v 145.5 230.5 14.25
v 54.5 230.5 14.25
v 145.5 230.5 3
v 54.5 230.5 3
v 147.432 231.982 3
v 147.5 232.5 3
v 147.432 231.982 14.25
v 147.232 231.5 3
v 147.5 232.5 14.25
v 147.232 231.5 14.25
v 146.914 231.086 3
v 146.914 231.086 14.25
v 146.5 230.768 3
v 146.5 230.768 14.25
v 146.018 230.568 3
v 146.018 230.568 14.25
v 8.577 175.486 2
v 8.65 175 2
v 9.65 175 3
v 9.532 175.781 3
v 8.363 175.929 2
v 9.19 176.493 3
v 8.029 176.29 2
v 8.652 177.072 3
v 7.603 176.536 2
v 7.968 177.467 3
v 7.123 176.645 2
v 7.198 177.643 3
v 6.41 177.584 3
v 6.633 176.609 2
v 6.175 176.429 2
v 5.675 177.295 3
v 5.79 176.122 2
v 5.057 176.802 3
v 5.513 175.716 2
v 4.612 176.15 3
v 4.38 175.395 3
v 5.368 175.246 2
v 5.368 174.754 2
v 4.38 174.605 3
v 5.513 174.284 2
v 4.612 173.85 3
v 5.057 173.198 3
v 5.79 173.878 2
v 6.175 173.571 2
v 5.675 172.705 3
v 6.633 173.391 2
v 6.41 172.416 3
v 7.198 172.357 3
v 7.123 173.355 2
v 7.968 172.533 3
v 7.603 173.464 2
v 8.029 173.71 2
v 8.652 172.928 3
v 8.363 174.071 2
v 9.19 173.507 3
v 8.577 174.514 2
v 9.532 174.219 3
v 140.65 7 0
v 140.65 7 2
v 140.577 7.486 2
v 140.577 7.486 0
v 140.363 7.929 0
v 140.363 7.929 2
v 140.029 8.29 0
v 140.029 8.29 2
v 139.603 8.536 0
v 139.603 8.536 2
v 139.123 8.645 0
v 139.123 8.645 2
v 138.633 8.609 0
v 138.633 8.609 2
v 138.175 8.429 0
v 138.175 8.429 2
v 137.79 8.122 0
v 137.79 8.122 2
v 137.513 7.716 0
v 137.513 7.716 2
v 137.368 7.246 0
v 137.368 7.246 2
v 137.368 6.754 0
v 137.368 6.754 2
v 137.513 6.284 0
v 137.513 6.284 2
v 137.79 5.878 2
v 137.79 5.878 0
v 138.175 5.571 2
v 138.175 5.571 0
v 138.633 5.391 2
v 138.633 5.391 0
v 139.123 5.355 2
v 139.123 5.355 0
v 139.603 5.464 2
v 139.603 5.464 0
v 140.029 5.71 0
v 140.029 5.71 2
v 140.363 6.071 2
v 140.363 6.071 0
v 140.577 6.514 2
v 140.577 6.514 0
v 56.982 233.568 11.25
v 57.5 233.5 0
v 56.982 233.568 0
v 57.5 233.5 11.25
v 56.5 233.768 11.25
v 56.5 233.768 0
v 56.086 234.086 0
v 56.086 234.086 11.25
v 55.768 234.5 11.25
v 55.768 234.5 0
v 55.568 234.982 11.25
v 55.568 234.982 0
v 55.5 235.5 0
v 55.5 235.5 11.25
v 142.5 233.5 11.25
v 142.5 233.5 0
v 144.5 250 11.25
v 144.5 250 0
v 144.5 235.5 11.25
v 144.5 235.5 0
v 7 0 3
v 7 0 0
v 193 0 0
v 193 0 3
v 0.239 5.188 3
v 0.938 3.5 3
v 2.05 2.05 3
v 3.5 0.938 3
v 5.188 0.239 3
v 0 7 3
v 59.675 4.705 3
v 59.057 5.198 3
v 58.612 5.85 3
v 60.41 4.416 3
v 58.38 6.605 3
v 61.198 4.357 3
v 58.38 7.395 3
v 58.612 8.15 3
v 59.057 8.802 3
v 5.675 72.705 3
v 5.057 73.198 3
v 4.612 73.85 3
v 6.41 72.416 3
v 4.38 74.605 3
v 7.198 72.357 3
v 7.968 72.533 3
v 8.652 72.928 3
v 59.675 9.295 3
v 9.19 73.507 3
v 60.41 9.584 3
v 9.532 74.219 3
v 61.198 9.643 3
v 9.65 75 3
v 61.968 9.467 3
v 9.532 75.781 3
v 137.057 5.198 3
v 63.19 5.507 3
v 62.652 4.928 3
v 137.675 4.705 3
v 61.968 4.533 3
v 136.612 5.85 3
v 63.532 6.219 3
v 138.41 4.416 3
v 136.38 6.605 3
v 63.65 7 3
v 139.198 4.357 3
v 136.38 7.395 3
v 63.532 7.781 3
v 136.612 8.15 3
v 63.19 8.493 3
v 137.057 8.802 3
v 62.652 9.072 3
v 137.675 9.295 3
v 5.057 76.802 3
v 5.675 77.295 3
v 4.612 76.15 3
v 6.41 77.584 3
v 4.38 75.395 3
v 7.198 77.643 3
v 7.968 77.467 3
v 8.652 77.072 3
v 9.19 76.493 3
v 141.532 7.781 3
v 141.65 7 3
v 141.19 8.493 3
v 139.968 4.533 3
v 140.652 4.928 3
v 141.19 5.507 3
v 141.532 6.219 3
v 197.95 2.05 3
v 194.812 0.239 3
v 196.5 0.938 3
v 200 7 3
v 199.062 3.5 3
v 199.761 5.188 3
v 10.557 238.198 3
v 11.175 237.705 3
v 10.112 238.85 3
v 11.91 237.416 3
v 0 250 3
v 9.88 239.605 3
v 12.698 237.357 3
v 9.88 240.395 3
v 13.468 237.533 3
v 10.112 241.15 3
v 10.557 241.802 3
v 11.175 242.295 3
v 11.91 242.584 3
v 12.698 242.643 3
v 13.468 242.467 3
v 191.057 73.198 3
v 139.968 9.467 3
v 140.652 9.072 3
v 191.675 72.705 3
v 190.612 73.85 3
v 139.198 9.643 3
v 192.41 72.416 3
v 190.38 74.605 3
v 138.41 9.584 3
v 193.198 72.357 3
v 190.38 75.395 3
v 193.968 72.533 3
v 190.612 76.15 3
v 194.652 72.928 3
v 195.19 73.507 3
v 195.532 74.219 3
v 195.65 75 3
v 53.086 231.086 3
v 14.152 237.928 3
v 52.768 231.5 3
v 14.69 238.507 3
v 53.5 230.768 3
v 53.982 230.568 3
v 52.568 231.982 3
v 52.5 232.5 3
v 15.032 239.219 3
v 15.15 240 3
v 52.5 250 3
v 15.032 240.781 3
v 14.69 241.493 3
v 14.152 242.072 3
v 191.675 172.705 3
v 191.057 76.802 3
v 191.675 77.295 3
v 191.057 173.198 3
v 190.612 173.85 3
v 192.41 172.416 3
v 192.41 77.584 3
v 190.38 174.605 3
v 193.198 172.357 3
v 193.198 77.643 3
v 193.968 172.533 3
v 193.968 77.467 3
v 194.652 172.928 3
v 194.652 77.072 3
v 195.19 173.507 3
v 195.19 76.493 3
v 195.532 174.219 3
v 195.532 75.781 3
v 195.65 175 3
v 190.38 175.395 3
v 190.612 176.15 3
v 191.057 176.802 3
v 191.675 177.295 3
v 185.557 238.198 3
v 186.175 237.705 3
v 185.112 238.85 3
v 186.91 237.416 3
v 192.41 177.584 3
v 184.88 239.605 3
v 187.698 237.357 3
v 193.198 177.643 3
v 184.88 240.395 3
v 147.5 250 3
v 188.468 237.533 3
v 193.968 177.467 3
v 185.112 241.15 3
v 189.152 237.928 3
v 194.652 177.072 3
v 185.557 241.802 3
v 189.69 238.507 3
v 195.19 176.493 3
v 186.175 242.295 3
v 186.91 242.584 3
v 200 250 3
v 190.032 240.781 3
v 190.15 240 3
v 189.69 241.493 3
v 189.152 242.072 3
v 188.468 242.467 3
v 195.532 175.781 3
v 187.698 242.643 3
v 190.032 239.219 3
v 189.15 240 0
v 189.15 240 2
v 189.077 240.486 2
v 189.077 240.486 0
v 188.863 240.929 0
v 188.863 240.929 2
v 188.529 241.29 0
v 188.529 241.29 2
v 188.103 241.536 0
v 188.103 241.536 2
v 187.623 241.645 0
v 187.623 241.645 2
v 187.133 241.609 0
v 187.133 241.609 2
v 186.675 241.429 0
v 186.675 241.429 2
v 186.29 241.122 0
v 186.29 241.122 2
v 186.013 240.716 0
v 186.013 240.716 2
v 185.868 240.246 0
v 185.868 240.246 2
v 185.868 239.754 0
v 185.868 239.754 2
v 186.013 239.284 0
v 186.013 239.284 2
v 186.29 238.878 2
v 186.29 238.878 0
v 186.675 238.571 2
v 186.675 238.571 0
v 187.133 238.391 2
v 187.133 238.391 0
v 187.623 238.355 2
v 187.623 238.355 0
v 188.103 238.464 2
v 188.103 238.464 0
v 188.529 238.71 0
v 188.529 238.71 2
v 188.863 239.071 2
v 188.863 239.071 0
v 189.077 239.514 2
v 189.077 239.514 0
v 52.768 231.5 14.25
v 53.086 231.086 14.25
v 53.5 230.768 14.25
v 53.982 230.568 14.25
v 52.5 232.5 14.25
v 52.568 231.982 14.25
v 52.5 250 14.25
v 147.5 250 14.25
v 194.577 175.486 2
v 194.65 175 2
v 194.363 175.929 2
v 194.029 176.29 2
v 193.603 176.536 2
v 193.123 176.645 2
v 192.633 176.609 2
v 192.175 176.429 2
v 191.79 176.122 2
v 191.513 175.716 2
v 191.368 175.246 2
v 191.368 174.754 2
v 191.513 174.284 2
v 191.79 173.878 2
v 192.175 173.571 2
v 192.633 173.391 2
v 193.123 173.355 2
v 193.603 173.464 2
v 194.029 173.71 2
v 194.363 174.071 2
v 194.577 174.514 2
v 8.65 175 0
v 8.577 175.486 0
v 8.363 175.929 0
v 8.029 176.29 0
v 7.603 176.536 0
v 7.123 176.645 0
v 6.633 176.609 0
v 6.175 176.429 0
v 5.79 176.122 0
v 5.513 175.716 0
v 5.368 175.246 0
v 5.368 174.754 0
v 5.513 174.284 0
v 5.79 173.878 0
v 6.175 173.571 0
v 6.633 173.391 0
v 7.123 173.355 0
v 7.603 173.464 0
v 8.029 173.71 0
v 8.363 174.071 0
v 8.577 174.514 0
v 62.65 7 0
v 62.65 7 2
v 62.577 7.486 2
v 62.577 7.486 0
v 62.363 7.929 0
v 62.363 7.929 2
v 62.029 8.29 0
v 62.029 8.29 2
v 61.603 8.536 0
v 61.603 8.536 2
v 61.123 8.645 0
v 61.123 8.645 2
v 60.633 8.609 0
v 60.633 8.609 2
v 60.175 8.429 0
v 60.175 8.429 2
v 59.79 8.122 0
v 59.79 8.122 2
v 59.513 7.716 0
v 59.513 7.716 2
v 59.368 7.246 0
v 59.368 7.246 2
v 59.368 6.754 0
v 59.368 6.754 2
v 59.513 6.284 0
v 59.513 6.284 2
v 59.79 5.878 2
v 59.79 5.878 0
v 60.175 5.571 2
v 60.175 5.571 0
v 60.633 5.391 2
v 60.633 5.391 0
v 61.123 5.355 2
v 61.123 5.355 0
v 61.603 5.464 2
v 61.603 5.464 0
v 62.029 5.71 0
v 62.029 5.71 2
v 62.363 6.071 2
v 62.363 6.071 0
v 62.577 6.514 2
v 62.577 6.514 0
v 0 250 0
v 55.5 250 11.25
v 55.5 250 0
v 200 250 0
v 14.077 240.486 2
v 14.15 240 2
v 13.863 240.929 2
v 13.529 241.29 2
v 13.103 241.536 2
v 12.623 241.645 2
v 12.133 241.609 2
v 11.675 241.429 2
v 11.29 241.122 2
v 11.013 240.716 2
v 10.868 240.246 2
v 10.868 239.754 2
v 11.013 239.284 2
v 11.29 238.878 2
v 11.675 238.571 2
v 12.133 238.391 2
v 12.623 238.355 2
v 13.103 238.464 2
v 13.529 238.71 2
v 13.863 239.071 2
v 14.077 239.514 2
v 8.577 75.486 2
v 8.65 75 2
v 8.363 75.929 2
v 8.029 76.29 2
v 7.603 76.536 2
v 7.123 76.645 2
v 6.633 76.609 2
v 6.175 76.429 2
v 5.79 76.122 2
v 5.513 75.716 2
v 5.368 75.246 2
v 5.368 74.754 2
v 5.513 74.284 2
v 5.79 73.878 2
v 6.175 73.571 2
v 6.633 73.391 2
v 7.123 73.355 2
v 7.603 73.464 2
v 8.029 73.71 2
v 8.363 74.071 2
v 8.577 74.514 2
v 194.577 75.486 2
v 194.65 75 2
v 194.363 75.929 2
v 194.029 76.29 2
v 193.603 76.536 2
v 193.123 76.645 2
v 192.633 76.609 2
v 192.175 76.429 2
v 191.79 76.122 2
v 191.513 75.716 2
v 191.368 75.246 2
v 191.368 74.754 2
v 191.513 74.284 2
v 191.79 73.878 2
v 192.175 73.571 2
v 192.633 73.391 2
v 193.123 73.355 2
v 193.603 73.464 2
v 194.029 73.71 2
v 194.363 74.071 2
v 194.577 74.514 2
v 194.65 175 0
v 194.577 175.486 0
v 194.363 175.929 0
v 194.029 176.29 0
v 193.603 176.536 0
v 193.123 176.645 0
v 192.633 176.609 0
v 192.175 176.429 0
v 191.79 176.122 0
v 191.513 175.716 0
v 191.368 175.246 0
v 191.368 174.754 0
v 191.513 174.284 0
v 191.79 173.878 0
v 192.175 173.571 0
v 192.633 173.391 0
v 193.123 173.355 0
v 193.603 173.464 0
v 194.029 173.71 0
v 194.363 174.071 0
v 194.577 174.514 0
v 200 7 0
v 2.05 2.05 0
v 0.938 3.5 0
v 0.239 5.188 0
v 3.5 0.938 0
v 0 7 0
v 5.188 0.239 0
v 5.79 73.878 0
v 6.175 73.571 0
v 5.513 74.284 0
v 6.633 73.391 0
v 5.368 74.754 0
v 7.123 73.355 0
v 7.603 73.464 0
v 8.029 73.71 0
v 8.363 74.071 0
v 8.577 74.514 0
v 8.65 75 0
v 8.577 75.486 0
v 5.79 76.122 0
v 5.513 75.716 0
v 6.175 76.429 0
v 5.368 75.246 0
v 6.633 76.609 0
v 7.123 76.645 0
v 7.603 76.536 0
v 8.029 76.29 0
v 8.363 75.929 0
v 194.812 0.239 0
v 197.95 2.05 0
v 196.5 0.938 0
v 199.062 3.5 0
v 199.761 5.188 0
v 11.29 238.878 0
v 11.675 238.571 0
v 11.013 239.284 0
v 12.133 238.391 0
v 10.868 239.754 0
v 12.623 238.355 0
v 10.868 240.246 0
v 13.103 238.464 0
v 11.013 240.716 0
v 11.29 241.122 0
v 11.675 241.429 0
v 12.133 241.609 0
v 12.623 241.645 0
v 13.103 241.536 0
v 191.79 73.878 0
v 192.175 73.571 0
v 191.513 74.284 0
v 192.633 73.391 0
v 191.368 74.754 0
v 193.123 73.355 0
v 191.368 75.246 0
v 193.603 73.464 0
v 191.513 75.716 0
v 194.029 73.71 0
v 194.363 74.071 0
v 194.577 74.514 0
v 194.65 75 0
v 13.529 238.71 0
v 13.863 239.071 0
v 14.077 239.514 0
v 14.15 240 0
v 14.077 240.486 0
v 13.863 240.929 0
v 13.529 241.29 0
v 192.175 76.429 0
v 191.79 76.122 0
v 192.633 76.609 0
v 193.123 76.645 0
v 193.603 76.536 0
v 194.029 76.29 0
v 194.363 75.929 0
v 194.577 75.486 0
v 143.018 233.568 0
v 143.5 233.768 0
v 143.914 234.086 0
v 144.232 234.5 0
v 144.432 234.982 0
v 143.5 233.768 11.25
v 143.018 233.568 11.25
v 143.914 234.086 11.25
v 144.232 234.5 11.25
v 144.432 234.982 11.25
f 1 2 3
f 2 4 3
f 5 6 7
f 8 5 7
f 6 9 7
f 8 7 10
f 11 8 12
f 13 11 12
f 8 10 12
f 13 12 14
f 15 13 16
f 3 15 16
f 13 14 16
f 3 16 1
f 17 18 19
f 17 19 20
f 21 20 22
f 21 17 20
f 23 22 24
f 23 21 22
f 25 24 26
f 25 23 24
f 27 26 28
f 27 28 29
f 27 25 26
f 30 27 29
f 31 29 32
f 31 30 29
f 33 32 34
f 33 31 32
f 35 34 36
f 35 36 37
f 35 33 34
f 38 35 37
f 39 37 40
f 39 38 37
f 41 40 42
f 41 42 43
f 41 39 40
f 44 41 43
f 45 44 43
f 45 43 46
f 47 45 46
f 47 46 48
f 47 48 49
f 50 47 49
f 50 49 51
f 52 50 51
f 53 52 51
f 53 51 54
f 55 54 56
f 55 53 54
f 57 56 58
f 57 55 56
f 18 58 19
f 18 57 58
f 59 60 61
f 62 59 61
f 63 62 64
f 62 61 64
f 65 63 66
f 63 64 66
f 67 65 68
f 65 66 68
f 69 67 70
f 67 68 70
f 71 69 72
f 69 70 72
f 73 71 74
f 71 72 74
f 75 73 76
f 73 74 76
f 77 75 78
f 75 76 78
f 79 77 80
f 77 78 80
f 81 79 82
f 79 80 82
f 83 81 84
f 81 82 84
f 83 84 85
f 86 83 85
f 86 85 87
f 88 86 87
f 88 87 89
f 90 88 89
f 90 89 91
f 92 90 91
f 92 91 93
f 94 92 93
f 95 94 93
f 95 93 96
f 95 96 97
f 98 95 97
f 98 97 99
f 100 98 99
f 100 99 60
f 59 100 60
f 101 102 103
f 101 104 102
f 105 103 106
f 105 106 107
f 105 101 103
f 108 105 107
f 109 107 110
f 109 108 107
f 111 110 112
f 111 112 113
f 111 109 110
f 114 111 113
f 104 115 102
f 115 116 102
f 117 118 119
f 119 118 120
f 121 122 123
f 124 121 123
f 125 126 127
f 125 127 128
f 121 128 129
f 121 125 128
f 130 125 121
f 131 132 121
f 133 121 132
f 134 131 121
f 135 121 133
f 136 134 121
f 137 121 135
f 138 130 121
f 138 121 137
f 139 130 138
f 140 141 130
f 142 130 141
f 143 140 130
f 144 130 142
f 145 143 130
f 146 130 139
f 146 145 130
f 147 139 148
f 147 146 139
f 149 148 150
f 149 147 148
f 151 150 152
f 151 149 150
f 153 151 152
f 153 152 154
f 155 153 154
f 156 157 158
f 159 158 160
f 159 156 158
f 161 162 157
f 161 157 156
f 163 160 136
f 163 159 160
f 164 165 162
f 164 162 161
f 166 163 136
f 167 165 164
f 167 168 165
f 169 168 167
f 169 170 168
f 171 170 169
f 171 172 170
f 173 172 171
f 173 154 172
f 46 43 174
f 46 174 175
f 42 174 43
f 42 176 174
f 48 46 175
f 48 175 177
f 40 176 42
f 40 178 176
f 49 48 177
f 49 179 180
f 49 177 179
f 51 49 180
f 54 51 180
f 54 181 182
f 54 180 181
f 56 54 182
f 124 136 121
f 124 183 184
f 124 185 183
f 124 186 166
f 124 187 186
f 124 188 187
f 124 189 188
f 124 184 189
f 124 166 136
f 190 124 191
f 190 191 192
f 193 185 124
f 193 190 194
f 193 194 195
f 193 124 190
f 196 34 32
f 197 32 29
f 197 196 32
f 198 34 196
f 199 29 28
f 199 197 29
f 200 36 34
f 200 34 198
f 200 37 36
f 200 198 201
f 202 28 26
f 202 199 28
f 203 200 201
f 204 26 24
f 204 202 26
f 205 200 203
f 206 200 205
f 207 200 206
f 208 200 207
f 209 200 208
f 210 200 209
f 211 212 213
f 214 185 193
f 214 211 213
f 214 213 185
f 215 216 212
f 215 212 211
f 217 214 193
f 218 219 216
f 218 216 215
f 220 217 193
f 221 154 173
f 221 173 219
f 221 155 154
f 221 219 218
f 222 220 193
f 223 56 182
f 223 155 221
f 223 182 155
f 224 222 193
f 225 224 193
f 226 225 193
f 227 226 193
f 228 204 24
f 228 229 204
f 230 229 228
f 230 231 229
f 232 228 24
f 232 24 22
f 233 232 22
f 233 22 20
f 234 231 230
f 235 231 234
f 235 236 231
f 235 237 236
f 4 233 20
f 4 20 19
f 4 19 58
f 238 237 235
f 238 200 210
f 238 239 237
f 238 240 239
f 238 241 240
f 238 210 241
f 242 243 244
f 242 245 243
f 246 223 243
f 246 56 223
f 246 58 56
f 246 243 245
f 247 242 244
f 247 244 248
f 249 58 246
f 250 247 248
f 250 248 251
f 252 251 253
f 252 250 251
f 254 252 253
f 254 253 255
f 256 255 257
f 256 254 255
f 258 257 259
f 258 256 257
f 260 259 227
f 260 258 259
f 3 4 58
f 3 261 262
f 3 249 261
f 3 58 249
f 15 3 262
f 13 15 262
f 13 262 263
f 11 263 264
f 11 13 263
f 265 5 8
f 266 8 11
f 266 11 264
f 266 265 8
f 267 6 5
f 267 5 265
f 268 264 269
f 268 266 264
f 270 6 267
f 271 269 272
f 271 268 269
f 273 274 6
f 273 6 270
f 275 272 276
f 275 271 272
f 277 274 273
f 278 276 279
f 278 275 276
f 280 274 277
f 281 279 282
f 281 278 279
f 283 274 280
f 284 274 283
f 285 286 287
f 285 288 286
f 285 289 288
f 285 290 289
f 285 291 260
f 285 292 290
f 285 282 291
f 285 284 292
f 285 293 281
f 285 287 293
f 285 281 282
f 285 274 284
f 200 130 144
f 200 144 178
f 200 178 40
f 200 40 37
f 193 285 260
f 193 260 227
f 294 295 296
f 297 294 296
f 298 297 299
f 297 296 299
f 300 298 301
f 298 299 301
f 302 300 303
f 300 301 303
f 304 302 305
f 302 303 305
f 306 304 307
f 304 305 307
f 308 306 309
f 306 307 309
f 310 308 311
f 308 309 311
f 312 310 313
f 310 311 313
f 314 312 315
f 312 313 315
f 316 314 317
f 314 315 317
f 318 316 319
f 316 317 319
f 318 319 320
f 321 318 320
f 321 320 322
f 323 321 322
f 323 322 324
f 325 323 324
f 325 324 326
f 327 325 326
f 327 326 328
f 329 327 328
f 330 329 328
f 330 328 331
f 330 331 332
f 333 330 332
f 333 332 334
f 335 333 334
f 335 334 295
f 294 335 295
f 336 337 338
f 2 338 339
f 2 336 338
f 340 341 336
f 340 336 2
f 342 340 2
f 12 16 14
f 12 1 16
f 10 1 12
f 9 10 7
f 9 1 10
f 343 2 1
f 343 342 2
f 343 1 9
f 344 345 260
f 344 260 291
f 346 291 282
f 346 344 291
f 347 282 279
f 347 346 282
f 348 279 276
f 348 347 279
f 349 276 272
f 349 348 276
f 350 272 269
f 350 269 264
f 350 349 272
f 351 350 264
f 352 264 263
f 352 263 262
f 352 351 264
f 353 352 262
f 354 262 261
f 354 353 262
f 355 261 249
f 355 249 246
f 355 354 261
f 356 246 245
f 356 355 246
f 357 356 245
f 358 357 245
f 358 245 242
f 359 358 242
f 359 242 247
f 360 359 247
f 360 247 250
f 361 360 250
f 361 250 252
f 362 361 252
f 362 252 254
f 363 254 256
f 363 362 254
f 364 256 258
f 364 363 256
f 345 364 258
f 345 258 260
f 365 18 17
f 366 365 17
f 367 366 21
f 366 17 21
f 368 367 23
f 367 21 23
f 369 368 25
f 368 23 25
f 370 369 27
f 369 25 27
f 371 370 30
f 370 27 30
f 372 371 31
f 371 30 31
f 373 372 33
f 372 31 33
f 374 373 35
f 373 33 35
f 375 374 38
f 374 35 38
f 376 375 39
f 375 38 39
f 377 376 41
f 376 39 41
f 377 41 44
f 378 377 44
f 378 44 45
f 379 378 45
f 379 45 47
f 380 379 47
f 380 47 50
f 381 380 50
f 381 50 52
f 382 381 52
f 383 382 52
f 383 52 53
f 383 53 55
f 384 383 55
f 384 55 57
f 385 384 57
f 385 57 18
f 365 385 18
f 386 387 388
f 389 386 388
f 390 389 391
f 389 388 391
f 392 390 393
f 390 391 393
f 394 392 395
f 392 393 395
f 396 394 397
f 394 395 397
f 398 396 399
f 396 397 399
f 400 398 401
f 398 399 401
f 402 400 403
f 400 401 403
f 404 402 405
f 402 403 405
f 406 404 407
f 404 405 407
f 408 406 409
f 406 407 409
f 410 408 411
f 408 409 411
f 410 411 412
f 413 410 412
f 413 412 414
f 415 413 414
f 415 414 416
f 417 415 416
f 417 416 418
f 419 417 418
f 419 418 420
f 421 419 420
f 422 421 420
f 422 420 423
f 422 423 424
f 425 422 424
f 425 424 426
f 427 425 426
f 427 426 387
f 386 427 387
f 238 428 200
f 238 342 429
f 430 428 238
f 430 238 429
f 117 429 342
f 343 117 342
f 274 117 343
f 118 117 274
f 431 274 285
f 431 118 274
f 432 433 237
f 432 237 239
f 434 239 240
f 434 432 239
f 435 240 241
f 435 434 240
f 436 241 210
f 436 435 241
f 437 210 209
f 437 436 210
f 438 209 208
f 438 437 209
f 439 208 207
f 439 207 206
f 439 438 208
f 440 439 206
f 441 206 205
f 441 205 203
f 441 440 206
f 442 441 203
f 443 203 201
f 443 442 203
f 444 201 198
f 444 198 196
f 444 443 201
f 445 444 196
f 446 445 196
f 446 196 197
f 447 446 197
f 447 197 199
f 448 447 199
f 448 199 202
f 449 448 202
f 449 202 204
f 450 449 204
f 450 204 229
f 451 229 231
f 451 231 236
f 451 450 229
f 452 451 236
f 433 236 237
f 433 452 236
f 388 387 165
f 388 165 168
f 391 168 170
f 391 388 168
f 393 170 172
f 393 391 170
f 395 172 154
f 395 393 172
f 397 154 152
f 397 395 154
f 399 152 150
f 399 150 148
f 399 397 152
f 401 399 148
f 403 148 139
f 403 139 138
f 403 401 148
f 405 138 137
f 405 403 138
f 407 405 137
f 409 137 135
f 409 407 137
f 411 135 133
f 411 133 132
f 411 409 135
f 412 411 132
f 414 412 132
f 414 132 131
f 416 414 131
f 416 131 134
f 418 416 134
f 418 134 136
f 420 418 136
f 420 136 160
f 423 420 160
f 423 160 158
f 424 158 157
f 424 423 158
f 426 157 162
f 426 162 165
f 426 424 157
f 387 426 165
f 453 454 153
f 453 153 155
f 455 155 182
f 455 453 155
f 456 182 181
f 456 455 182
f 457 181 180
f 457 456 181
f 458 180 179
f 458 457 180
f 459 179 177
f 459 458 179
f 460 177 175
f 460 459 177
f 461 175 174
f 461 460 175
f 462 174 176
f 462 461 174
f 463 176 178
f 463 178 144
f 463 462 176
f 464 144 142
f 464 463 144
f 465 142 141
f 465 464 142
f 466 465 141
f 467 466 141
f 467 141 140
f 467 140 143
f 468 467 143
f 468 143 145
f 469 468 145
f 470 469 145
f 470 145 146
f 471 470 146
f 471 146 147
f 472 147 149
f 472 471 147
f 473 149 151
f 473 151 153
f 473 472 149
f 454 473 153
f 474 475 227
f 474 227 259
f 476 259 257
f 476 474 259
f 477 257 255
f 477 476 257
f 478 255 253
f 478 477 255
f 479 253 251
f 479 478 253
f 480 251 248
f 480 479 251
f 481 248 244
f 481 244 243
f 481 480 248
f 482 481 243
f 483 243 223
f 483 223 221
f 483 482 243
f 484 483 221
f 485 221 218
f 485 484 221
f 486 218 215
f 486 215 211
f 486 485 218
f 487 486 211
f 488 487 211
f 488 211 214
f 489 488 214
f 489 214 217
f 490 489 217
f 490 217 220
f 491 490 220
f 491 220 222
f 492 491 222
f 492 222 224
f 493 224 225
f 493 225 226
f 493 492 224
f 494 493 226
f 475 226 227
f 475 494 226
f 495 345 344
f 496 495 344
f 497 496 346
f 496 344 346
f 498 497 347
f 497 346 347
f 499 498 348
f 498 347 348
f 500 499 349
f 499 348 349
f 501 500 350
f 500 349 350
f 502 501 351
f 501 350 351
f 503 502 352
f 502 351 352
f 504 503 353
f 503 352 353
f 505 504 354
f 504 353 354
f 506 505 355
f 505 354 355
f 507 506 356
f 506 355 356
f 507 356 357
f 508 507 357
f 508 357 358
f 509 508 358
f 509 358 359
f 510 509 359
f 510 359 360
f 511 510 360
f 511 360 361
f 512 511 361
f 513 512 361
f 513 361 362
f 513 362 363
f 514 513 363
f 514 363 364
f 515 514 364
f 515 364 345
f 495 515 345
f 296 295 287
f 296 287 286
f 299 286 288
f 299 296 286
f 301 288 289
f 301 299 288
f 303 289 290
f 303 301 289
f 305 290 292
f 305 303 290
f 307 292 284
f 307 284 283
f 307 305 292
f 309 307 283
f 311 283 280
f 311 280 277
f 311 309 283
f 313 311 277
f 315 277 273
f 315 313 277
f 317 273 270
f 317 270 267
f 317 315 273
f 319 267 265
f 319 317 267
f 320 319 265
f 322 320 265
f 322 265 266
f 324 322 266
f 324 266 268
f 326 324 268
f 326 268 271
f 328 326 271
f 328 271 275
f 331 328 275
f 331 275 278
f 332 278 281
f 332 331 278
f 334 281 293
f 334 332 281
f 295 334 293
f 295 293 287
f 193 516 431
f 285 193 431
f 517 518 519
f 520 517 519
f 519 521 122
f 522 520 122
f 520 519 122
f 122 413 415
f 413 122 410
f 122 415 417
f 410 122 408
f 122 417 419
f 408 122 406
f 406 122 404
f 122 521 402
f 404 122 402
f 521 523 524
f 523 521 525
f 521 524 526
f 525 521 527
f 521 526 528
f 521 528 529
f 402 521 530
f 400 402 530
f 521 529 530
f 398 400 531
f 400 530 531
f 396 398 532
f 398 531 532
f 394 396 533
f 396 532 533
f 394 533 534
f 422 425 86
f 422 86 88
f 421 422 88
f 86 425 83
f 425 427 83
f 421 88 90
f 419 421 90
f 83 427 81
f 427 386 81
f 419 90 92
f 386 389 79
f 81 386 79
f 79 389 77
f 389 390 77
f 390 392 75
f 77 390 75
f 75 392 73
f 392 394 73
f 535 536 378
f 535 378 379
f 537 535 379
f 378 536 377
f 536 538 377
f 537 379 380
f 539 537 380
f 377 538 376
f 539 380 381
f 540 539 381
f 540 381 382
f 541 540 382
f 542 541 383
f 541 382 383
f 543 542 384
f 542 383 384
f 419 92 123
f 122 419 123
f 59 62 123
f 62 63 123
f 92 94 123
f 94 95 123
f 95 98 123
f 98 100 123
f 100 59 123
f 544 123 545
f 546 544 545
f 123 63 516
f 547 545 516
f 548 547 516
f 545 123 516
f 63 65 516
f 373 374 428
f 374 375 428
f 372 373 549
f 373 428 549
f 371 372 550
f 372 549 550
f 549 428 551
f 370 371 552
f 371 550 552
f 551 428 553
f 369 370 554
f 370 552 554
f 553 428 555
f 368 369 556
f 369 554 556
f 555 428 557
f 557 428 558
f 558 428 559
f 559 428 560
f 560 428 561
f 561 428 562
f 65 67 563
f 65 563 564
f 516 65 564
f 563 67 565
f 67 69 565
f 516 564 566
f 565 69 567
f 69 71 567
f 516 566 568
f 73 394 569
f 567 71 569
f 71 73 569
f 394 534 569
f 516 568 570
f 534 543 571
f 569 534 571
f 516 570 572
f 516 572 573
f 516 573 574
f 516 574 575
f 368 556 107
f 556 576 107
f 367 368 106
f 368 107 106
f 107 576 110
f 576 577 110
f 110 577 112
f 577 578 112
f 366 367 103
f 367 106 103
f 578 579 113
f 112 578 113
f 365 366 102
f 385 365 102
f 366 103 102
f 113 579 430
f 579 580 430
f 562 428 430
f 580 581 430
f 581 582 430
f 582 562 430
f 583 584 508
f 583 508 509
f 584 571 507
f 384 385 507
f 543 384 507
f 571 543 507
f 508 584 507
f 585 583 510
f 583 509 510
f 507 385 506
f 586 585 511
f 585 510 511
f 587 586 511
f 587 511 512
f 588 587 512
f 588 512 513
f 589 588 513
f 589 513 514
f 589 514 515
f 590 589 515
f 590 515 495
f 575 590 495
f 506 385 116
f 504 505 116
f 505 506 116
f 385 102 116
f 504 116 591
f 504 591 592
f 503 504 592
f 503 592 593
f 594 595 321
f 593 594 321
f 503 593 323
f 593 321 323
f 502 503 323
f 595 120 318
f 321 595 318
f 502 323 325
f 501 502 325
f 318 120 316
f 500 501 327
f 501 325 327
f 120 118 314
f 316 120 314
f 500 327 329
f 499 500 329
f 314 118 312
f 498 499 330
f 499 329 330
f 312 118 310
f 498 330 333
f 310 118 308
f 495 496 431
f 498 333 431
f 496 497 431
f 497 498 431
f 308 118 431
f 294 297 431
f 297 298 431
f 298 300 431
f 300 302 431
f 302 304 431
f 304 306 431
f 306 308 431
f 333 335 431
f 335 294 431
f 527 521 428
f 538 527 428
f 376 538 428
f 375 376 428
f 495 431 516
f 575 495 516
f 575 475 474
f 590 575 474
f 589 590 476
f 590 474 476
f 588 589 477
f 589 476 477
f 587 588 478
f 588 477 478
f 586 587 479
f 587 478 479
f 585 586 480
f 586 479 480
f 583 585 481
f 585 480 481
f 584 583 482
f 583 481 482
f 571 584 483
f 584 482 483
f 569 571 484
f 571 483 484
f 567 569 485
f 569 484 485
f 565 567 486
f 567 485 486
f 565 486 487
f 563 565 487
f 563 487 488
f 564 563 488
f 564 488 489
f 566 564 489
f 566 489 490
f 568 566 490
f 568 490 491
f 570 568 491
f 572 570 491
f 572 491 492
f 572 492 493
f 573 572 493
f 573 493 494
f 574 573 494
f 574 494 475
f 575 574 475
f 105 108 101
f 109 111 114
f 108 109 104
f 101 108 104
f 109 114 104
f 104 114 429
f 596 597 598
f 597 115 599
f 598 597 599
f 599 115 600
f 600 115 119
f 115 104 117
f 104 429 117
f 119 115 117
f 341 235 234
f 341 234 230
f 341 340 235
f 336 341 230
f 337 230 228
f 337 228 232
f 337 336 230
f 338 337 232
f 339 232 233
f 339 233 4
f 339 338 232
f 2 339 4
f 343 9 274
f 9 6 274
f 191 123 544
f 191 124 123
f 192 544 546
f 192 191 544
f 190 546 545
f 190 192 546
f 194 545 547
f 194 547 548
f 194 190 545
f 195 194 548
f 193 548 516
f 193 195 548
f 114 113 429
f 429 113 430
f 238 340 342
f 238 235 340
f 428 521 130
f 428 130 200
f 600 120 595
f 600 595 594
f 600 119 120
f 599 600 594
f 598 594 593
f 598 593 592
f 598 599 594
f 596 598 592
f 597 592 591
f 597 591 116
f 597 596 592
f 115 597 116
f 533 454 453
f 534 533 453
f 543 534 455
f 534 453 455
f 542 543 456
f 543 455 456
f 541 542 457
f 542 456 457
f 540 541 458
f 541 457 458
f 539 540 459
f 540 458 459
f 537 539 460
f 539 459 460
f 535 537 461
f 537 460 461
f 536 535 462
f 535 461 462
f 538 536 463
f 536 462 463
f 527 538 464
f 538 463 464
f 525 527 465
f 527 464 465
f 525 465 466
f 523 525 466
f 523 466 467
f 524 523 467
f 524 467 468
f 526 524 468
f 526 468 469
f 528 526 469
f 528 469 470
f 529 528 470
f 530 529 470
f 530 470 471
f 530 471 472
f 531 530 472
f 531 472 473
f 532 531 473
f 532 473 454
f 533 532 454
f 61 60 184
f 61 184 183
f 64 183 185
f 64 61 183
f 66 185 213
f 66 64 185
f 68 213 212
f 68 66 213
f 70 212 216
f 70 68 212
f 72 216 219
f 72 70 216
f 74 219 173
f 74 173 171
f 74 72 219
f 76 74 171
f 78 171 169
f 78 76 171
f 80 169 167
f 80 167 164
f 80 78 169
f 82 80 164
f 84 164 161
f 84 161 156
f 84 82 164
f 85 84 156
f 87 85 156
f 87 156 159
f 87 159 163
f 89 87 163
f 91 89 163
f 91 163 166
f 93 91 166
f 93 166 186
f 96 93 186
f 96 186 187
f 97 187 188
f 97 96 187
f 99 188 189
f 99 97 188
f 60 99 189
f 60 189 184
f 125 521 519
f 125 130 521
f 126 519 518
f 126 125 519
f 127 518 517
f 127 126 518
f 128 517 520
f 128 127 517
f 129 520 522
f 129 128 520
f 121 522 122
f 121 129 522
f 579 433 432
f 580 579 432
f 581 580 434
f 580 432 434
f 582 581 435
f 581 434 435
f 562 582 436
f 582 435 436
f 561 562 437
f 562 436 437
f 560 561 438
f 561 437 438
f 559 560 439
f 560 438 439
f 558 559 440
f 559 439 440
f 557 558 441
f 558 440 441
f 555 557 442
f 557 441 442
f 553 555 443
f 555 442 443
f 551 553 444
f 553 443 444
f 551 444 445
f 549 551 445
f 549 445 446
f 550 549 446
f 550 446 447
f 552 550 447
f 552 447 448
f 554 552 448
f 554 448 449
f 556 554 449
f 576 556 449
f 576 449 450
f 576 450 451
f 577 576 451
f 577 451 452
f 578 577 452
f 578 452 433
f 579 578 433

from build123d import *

# Parameters (mm, degrees)
SKETCH1_W           = 200
SKETCH1_H           = 250
BOSS_EXTRUDE1_DEPTH = 3
FILLET1_R           = 7
SKETCH2_W           = 89
SKETCH2_H           = 16.5
CUT_EXTRUDE2_DEPTH  = 3
EXTRUDE_THIN1_DEPTH = 8.25
SKETCH4_W           = 95
SKETCH4_H           = 19.5
BOSS_EXTRUDE2_DEPTH = 3
FILLET2_R           = 2
FILLET3_R           = 2
SKETCH5_R           = 1.65
CUT_EXTRUDE3_DEPTH  = 4
CHAMFER1_SIZE       = 1


with BuildPart() as part:
    # Sketch1 → Boss-Extrude1 (new body)
    with BuildSketch(Plane.XY):
        with Locations((100, 125)):
            Rectangle(SKETCH1_W, SKETCH1_H)
    extrude(amount=BOSS_EXTRUDE1_DEPTH)

    # Fillet1
    fillet1_edges = [part.edges().sort_by_distance(p)[0] for p in [
        (200, 0, 1.5),
        (0, 0, 1.5),
    ]]
    fillet(fillet1_edges, radius=FILLET1_R)

    # Sketch2 → Cut-Extrude2 (cut)
    with BuildSketch(Plane.XY):
        with Locations((100, 241.75)):
            Rectangle(SKETCH2_W, SKETCH2_H)
    extrude(amount=CUT_EXTRUDE2_DEPTH, mode=Mode.SUBTRACT)

    # Sketch3 → Extrude-Thin1 (add)
    with BuildSketch(Plane.XY.offset(3)):
        Polygon((144.5, 250), (144.5, 233.5), (55.5, 233.5), (55.5, 250), (52.5, 250), (52.5, 230.5), (147.5, 230.5), (147.5, 250), align=None)
    extrude(amount=EXTRUDE_THIN1_DEPTH)

    # Sketch4 → Boss-Extrude2 (add)
    with BuildSketch(Plane.XY.offset(11.25)):
        with Locations((100, 240.25)):
            Rectangle(SKETCH4_W, SKETCH4_H)
    extrude(amount=BOSS_EXTRUDE2_DEPTH)

    # Fillet2
    fillet2_edges = [part.edges().sort_by_distance(p)[0] for p in [
        (144.5, 233.5, 5.625),
        (55.5, 233.5, 5.625),
    ]]
    fillet(fillet2_edges, radius=FILLET2_R)

    # Fillet3
    fillet3_edges = [part.edges().sort_by_distance(p)[0] for p in [
        (52.5, 230.5, 8.625),
        (147.5, 230.5, 8.625),
    ]]
    fillet(fillet3_edges, radius=FILLET3_R)

    # Sketch5 → Cut-Extrude3 (cut, through all)
    with BuildSketch(Plane.XY.offset(3)):
        with Locations((12.5, 240)):
            Circle(SKETCH5_R)
        with Locations((187.5, 240)):
            Circle(SKETCH5_R)
        with Locations((7, 175)):
            Circle(SKETCH5_R)
        with Locations((7, 75)):
            Circle(SKETCH5_R)
        with Locations((61, 7)):
            Circle(SKETCH5_R)
        with Locations((139, 7)):
            Circle(SKETCH5_R)
        with Locations((193, 175)):
            Circle(SKETCH5_R)
        with Locations((193, 75)):
            Circle(SKETCH5_R)
    extrude(amount=-CUT_EXTRUDE3_DEPTH, mode=Mode.SUBTRACT)

    # Chamfer1
    chamfer1_edges = [part.edges().sort_by_distance(p)[0] for p in [
        (185.85, 240, 3),
        (5.35, 175, 3),
        (5.35, 75, 3),
        (59.35, 7, 3),
        (191.35, 75, 3),
        (191.35, 175, 3),
        (137.35, 7, 3),
        (10.85, 240, 3),
    ]]
    chamfer(chamfer1_edges, length=CHAMFER1_SIZE)


solid = part.part
